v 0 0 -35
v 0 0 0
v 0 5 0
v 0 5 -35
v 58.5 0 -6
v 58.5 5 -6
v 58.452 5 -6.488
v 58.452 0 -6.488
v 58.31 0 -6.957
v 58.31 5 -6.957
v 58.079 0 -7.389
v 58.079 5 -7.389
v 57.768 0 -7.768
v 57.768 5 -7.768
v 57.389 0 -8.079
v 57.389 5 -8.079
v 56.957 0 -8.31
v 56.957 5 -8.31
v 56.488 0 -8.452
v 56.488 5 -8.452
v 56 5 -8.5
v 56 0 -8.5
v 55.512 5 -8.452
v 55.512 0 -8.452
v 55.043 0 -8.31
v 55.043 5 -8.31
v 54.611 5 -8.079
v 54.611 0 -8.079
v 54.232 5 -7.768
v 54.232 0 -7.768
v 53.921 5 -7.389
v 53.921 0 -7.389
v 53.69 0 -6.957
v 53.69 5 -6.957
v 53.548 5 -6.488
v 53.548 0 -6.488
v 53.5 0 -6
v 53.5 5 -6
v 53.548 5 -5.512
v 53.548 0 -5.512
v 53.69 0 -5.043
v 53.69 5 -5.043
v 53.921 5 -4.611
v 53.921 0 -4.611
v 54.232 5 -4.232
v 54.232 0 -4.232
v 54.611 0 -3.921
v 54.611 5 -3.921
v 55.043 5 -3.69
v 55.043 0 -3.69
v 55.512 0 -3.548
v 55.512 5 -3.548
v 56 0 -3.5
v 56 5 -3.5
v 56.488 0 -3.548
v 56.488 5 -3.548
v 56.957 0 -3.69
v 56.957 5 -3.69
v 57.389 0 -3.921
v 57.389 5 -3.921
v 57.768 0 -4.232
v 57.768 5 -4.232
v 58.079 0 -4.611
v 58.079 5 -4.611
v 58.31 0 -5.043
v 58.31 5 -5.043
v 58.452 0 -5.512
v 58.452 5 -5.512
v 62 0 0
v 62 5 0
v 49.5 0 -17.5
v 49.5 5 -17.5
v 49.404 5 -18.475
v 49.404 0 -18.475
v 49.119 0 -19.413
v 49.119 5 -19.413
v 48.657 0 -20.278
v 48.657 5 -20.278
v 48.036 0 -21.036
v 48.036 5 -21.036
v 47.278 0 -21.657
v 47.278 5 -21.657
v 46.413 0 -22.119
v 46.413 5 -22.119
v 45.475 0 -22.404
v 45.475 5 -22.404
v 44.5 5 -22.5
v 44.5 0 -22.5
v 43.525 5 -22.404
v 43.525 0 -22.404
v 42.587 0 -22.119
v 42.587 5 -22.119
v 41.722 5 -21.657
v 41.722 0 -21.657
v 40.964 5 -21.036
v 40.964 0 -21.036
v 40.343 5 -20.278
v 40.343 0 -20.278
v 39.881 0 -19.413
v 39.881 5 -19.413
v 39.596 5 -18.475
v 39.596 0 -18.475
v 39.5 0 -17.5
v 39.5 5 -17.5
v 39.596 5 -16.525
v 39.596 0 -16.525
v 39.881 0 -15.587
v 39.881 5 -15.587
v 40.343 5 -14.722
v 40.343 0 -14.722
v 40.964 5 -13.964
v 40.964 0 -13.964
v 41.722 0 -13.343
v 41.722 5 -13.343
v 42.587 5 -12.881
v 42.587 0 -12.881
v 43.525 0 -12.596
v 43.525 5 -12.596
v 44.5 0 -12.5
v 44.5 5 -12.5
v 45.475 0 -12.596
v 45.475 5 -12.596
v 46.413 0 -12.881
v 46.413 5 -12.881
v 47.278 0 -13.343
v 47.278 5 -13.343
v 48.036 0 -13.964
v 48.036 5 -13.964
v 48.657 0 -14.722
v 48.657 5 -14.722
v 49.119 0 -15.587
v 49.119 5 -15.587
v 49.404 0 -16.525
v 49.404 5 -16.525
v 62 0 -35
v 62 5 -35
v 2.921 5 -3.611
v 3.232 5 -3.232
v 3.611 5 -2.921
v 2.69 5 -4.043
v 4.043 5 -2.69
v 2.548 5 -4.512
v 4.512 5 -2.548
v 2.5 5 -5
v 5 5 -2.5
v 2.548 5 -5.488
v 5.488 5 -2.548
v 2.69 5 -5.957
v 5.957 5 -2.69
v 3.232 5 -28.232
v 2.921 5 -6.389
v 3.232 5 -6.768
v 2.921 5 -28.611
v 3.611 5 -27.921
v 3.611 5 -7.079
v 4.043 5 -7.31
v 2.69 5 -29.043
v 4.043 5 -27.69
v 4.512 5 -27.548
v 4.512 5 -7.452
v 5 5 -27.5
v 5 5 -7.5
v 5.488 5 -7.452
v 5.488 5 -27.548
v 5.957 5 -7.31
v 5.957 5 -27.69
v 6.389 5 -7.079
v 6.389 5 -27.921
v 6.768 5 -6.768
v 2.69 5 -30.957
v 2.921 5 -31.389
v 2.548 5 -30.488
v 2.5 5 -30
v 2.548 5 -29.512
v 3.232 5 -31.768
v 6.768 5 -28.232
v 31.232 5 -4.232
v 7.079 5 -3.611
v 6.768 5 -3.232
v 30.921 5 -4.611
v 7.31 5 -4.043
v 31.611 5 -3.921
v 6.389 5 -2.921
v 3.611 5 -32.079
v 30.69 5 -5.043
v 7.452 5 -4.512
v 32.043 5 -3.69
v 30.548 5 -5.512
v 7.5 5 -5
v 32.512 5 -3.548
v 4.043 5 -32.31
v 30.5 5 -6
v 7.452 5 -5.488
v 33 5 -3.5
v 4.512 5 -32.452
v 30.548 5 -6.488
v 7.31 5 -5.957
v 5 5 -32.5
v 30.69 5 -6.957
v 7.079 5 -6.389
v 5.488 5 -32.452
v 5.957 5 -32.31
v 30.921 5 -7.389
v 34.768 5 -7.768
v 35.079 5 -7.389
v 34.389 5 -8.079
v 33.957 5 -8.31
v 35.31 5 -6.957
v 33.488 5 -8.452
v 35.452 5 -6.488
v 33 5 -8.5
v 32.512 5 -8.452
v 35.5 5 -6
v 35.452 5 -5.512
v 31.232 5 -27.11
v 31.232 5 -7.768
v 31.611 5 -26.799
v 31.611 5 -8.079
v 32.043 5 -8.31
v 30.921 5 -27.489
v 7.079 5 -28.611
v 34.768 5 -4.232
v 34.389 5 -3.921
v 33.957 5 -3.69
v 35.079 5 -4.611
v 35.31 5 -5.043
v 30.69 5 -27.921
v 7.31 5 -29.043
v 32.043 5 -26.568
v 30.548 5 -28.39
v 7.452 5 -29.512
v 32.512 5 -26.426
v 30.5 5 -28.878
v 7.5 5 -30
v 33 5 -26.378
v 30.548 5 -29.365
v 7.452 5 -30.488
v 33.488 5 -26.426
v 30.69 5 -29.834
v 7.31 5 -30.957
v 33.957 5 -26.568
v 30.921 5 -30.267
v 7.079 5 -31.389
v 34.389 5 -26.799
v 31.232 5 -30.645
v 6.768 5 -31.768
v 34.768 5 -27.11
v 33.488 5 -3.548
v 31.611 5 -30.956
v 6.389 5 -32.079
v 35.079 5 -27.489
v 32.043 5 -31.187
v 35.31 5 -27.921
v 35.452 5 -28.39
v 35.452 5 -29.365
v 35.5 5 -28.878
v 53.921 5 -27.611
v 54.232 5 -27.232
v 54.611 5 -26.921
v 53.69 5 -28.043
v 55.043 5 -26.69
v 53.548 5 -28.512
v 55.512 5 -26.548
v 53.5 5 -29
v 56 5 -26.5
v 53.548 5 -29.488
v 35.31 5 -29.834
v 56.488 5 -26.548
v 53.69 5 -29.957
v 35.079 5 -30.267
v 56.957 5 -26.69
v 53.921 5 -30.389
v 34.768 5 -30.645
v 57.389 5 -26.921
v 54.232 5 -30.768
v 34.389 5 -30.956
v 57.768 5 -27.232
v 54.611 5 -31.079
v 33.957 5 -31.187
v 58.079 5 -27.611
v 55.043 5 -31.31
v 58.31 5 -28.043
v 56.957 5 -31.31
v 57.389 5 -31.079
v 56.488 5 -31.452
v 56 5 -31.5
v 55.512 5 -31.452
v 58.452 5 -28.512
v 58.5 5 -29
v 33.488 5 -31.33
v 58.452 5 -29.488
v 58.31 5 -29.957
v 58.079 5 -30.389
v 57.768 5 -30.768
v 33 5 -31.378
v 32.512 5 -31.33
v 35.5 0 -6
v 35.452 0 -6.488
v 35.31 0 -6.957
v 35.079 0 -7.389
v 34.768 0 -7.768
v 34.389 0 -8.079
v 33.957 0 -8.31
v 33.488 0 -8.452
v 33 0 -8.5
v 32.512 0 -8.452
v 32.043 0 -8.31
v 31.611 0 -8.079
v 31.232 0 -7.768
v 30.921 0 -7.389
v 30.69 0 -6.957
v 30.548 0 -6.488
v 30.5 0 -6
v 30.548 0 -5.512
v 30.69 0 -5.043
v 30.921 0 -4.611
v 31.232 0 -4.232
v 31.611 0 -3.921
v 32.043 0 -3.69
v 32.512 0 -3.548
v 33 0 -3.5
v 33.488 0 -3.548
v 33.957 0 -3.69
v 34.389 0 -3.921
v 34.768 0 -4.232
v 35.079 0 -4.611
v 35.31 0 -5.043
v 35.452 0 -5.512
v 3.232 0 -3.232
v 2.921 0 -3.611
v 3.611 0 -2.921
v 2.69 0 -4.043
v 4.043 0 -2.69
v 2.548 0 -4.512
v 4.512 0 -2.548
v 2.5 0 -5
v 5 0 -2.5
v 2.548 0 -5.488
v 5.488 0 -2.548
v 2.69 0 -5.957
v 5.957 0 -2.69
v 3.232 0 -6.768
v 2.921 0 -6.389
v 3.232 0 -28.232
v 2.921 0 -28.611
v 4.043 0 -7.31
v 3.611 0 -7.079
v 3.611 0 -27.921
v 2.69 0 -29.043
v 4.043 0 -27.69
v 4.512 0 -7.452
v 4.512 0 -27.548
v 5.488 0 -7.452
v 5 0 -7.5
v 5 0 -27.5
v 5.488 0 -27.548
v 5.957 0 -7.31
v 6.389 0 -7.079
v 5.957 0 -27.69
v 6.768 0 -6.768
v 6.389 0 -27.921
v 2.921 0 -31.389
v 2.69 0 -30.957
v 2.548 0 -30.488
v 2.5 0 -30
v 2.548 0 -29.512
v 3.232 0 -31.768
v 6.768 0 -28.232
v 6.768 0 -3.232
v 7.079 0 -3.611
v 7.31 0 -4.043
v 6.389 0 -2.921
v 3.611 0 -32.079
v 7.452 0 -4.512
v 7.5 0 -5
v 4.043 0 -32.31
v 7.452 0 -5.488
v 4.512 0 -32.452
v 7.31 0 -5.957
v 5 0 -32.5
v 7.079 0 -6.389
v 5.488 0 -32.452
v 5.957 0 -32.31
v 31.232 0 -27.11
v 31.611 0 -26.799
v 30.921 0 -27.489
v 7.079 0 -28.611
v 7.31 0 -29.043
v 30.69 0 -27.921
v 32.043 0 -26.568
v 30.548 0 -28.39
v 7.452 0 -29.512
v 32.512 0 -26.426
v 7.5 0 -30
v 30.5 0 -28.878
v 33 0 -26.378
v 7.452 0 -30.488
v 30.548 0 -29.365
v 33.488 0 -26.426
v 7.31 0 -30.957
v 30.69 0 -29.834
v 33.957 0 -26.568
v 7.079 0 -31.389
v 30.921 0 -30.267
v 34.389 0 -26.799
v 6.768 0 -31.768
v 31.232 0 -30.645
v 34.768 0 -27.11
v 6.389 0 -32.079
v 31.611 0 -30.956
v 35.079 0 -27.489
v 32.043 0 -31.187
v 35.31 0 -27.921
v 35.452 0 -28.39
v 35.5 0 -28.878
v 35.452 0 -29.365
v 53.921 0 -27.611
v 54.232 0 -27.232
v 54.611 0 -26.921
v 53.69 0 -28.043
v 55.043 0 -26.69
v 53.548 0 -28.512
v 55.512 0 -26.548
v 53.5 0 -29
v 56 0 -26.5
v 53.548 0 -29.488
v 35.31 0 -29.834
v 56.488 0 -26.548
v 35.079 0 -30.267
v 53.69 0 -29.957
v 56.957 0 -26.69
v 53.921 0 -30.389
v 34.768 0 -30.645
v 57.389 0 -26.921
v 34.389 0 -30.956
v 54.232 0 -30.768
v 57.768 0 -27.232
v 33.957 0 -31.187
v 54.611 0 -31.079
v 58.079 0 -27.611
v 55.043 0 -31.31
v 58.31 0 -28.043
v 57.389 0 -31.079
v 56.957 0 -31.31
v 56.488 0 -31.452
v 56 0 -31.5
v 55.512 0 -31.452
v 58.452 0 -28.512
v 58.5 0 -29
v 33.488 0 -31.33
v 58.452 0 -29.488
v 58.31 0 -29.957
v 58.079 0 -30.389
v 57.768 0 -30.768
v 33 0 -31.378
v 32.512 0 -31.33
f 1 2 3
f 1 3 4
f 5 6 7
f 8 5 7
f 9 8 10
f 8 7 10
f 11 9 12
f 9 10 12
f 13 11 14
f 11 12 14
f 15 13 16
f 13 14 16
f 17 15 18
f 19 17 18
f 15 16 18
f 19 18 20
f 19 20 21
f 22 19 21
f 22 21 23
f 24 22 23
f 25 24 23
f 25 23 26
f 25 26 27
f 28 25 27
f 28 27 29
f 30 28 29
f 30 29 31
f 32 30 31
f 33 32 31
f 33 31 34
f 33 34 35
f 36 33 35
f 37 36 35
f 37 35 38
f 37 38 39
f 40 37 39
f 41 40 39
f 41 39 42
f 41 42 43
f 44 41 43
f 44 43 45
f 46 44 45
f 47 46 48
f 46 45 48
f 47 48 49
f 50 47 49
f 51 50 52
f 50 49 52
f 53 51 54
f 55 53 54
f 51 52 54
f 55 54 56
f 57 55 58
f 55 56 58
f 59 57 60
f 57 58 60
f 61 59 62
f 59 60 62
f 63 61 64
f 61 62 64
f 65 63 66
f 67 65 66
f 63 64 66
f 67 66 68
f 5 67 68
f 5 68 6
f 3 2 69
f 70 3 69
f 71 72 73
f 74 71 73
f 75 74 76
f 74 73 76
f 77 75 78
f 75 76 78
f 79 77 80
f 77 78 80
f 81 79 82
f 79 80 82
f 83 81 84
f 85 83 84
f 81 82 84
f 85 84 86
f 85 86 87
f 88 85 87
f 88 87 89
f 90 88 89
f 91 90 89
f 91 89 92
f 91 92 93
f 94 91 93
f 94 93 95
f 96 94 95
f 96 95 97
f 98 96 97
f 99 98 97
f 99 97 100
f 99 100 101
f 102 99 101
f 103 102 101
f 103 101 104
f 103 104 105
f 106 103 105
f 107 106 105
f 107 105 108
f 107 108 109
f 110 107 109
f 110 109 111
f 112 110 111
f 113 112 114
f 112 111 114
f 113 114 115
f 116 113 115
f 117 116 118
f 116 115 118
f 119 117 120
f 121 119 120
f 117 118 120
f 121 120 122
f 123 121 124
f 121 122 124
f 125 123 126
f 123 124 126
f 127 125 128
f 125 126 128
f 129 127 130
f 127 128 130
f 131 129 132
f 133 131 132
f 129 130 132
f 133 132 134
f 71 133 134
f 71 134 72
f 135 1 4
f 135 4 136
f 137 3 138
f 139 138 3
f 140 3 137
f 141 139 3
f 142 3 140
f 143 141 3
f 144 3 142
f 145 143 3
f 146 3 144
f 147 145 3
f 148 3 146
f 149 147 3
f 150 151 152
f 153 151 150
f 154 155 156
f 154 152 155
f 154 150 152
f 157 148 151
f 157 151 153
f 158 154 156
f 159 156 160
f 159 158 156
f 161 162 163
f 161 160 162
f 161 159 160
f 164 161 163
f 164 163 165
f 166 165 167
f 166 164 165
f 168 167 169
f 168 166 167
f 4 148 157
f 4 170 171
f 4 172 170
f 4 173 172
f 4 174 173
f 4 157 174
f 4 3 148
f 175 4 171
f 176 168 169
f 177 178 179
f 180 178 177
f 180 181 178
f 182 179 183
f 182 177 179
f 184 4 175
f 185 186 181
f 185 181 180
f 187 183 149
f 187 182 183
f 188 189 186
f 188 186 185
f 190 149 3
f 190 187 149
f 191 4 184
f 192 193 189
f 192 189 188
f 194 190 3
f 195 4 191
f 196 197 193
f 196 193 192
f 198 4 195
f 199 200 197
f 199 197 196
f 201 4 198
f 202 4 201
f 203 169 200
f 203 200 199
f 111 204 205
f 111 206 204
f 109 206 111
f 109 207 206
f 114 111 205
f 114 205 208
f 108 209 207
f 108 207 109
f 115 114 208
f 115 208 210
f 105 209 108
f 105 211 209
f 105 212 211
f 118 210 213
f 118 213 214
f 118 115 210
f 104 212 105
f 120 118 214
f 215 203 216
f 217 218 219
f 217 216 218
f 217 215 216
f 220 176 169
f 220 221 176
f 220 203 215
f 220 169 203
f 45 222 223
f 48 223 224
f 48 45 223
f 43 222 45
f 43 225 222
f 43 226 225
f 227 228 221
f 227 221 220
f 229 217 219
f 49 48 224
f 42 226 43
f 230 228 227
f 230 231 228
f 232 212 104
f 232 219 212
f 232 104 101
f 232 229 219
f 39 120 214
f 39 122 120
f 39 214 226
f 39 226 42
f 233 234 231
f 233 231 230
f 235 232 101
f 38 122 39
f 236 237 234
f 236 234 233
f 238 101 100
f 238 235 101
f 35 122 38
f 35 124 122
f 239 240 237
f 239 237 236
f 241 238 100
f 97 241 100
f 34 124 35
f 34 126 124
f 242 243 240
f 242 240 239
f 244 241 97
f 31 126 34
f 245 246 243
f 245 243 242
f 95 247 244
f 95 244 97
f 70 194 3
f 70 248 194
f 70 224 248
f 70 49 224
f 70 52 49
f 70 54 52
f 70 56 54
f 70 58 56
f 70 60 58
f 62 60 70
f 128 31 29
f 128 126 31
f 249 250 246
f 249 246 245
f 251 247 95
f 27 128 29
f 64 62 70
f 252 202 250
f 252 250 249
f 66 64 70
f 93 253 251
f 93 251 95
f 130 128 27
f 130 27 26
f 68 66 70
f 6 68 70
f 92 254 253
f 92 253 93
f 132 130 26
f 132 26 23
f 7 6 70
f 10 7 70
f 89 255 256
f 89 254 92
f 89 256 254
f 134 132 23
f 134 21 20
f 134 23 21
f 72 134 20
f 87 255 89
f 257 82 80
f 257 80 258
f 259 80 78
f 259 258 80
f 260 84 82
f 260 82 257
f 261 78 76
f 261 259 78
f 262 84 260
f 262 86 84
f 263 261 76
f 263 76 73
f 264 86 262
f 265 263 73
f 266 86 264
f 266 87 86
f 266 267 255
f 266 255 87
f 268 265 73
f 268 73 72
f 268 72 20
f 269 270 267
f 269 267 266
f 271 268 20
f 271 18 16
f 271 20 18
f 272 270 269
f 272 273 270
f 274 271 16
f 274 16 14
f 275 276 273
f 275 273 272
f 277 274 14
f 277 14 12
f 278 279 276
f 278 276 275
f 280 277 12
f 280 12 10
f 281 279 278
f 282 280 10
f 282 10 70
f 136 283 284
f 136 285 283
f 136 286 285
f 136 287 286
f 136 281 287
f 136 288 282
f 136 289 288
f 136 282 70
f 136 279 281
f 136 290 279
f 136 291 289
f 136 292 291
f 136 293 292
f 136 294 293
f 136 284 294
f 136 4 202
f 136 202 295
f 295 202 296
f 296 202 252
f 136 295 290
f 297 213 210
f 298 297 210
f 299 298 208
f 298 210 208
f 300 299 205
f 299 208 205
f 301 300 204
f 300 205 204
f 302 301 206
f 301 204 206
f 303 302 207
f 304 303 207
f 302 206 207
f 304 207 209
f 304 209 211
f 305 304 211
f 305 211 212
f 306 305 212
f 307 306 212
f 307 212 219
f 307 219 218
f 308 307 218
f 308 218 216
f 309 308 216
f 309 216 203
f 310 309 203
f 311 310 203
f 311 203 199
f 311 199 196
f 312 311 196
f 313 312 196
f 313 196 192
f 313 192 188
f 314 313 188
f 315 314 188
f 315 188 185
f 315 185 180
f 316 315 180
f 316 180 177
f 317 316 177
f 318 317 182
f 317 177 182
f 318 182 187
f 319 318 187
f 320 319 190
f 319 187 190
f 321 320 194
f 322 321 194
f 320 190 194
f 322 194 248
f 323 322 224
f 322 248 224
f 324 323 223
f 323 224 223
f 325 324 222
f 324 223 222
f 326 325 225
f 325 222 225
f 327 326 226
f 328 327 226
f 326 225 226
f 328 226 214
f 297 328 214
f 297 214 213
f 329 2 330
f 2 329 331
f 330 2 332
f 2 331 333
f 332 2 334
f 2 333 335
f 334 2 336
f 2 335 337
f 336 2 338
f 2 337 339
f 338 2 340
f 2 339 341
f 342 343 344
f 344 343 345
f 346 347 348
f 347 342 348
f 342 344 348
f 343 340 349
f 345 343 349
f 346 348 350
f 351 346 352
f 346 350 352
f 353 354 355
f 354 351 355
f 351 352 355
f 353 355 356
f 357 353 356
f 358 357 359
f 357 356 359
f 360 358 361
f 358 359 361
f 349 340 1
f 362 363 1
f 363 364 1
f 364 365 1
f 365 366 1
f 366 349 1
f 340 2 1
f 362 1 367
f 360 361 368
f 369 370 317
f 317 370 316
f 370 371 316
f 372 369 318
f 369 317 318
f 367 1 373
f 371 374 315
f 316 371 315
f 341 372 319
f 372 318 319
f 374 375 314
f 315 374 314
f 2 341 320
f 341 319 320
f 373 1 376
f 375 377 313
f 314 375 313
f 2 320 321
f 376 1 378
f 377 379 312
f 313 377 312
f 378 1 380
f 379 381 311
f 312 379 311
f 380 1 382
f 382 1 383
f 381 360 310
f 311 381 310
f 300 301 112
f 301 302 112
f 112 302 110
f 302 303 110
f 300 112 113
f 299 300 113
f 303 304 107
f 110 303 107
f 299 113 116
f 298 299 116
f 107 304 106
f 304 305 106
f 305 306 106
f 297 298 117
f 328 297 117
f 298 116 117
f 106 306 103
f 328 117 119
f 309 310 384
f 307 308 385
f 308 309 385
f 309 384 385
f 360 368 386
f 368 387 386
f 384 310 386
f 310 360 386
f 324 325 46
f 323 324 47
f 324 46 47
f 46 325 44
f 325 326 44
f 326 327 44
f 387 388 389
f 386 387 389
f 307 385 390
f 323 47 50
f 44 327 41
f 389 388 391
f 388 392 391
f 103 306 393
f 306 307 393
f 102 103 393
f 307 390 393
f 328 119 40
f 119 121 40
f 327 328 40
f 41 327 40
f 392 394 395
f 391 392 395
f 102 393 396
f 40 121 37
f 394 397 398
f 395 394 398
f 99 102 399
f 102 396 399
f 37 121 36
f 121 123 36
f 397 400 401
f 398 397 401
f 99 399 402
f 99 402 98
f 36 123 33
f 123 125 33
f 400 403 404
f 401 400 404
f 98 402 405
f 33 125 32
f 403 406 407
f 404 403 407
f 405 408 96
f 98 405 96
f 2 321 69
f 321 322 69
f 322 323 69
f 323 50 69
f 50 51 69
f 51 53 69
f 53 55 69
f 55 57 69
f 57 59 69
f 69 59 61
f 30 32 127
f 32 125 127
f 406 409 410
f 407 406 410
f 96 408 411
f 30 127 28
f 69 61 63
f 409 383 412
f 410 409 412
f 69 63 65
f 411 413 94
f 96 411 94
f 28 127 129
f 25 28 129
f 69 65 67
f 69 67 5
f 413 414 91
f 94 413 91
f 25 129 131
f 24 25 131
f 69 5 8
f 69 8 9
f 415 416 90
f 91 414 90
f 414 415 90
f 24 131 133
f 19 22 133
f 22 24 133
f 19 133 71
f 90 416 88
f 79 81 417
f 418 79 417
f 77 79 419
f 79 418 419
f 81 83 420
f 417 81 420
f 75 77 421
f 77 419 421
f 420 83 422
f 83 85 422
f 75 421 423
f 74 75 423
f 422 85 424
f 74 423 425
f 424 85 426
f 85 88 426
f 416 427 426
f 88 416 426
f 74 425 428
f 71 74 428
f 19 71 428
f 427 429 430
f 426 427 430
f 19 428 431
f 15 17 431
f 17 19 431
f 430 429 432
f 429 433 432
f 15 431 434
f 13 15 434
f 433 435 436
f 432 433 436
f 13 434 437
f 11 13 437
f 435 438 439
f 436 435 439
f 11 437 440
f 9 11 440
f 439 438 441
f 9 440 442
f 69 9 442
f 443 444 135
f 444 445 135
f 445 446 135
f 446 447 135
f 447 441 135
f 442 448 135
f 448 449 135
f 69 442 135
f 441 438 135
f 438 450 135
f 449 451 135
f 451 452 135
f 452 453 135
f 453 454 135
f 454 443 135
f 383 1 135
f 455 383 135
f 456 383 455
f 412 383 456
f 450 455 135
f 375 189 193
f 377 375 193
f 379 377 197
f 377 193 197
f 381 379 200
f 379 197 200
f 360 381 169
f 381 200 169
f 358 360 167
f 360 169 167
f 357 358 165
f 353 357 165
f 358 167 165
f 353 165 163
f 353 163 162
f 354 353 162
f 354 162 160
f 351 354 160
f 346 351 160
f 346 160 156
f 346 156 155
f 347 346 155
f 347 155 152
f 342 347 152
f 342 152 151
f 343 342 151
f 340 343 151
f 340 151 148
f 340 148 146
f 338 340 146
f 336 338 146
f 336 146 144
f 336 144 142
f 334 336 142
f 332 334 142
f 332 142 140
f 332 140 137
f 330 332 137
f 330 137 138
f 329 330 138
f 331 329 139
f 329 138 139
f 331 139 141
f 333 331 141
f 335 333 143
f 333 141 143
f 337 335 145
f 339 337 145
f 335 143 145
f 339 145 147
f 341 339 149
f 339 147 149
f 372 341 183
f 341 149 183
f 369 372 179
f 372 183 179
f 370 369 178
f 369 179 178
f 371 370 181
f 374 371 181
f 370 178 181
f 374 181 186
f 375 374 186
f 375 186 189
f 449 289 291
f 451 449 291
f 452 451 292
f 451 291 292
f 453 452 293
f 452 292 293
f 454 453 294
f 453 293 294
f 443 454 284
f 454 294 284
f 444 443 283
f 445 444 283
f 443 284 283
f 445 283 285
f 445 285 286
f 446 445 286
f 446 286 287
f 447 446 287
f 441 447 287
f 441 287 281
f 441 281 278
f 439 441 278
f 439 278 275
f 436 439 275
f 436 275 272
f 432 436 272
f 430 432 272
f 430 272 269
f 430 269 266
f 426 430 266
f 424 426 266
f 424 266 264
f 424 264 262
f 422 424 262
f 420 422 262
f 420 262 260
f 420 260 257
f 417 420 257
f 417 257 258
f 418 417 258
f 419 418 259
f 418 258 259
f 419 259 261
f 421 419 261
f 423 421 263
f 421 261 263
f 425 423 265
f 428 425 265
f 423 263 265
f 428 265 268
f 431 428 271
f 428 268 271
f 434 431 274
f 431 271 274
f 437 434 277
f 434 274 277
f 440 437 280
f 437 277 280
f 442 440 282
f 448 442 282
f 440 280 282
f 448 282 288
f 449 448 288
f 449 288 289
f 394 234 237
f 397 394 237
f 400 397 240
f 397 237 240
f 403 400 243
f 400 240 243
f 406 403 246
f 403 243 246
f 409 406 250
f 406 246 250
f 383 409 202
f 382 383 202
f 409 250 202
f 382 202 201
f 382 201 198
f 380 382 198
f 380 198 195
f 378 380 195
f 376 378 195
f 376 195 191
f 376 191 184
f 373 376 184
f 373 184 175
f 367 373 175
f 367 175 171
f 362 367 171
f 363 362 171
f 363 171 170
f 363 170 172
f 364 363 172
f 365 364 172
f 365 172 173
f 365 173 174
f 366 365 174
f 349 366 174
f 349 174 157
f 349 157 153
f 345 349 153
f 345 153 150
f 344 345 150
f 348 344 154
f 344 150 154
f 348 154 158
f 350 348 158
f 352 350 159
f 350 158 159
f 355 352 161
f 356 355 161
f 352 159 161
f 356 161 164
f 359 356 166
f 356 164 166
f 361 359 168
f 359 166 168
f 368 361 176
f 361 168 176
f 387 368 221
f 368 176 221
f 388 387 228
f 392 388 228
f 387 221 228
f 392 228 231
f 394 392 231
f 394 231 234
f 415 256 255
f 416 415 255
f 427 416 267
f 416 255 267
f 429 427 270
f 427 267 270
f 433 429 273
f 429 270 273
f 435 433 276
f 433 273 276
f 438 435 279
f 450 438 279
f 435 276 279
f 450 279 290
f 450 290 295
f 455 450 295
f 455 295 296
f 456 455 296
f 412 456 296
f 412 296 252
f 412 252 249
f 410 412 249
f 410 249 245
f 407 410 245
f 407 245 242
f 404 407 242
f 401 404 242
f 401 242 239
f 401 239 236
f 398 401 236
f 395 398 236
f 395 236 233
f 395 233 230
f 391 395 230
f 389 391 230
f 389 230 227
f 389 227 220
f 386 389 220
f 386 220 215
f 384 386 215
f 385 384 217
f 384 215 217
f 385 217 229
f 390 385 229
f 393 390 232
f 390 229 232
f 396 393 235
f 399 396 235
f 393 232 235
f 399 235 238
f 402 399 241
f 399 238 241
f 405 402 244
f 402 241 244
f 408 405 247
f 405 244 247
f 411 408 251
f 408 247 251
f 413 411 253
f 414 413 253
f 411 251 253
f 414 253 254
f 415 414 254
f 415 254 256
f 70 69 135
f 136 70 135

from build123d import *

# Parameters (mm, degrees)
SKETCH1_W           = 62
SKETCH1_H           = 35
BOSS_EXTRUDE1_DEPTH = 5
SKETCH2_R           = 2.5
CUT_EXTRUDE1_DEPTH  = 6
SKETCH3_R           = 2.5
SKETCH3_R_2         = 5
CUT_EXTRUDE2_DEPTH  = 6


with BuildPart() as part:
    # Sketch1 → Boss-Extrude1 (new body)
    with BuildSketch(Plane(origin=(0, 0, 0), x_dir=(1, 0, 0), z_dir=(0, 1, 0))):
        with Locations((31, 17.5)):
            Rectangle(SKETCH1_W, SKETCH1_H)
    extrude(amount=BOSS_EXTRUDE1_DEPTH)

    # Sketch2 → Cut-Extrude1 (cut, through all)
    with BuildSketch(Plane(origin=(0, 5, 0), x_dir=(1, 0, 0), z_dir=(0, 1, 0))):
        with Locations((5, 30)):
            Circle(SKETCH2_R)
        with Locations((5, 5)):
            Circle(SKETCH2_R)
    extrude(amount=-CUT_EXTRUDE1_DEPTH, mode=Mode.SUBTRACT)

    # Sketch3 → Cut-Extrude2 (cut, through all)
    with BuildSketch(Plane(origin=(0, 5, 0), x_dir=(1, 0, 0), z_dir=(0, 1, 0))):
        with Locations((56, 29)):
            Circle(SKETCH3_R)
        with Locations((56, 6)):
            Circle(SKETCH3_R)
        with Locations((33, 28.877597721)):
            Circle(SKETCH3_R)
        with Locations((33, 6)):
            Circle(SKETCH3_R)
        with Locations((44.5, 17.5)):
            Circle(SKETCH3_R_2)
    extrude(amount=-CUT_EXTRUDE2_DEPTH, mode=Mode.SUBTRACT)


solid = part.part
